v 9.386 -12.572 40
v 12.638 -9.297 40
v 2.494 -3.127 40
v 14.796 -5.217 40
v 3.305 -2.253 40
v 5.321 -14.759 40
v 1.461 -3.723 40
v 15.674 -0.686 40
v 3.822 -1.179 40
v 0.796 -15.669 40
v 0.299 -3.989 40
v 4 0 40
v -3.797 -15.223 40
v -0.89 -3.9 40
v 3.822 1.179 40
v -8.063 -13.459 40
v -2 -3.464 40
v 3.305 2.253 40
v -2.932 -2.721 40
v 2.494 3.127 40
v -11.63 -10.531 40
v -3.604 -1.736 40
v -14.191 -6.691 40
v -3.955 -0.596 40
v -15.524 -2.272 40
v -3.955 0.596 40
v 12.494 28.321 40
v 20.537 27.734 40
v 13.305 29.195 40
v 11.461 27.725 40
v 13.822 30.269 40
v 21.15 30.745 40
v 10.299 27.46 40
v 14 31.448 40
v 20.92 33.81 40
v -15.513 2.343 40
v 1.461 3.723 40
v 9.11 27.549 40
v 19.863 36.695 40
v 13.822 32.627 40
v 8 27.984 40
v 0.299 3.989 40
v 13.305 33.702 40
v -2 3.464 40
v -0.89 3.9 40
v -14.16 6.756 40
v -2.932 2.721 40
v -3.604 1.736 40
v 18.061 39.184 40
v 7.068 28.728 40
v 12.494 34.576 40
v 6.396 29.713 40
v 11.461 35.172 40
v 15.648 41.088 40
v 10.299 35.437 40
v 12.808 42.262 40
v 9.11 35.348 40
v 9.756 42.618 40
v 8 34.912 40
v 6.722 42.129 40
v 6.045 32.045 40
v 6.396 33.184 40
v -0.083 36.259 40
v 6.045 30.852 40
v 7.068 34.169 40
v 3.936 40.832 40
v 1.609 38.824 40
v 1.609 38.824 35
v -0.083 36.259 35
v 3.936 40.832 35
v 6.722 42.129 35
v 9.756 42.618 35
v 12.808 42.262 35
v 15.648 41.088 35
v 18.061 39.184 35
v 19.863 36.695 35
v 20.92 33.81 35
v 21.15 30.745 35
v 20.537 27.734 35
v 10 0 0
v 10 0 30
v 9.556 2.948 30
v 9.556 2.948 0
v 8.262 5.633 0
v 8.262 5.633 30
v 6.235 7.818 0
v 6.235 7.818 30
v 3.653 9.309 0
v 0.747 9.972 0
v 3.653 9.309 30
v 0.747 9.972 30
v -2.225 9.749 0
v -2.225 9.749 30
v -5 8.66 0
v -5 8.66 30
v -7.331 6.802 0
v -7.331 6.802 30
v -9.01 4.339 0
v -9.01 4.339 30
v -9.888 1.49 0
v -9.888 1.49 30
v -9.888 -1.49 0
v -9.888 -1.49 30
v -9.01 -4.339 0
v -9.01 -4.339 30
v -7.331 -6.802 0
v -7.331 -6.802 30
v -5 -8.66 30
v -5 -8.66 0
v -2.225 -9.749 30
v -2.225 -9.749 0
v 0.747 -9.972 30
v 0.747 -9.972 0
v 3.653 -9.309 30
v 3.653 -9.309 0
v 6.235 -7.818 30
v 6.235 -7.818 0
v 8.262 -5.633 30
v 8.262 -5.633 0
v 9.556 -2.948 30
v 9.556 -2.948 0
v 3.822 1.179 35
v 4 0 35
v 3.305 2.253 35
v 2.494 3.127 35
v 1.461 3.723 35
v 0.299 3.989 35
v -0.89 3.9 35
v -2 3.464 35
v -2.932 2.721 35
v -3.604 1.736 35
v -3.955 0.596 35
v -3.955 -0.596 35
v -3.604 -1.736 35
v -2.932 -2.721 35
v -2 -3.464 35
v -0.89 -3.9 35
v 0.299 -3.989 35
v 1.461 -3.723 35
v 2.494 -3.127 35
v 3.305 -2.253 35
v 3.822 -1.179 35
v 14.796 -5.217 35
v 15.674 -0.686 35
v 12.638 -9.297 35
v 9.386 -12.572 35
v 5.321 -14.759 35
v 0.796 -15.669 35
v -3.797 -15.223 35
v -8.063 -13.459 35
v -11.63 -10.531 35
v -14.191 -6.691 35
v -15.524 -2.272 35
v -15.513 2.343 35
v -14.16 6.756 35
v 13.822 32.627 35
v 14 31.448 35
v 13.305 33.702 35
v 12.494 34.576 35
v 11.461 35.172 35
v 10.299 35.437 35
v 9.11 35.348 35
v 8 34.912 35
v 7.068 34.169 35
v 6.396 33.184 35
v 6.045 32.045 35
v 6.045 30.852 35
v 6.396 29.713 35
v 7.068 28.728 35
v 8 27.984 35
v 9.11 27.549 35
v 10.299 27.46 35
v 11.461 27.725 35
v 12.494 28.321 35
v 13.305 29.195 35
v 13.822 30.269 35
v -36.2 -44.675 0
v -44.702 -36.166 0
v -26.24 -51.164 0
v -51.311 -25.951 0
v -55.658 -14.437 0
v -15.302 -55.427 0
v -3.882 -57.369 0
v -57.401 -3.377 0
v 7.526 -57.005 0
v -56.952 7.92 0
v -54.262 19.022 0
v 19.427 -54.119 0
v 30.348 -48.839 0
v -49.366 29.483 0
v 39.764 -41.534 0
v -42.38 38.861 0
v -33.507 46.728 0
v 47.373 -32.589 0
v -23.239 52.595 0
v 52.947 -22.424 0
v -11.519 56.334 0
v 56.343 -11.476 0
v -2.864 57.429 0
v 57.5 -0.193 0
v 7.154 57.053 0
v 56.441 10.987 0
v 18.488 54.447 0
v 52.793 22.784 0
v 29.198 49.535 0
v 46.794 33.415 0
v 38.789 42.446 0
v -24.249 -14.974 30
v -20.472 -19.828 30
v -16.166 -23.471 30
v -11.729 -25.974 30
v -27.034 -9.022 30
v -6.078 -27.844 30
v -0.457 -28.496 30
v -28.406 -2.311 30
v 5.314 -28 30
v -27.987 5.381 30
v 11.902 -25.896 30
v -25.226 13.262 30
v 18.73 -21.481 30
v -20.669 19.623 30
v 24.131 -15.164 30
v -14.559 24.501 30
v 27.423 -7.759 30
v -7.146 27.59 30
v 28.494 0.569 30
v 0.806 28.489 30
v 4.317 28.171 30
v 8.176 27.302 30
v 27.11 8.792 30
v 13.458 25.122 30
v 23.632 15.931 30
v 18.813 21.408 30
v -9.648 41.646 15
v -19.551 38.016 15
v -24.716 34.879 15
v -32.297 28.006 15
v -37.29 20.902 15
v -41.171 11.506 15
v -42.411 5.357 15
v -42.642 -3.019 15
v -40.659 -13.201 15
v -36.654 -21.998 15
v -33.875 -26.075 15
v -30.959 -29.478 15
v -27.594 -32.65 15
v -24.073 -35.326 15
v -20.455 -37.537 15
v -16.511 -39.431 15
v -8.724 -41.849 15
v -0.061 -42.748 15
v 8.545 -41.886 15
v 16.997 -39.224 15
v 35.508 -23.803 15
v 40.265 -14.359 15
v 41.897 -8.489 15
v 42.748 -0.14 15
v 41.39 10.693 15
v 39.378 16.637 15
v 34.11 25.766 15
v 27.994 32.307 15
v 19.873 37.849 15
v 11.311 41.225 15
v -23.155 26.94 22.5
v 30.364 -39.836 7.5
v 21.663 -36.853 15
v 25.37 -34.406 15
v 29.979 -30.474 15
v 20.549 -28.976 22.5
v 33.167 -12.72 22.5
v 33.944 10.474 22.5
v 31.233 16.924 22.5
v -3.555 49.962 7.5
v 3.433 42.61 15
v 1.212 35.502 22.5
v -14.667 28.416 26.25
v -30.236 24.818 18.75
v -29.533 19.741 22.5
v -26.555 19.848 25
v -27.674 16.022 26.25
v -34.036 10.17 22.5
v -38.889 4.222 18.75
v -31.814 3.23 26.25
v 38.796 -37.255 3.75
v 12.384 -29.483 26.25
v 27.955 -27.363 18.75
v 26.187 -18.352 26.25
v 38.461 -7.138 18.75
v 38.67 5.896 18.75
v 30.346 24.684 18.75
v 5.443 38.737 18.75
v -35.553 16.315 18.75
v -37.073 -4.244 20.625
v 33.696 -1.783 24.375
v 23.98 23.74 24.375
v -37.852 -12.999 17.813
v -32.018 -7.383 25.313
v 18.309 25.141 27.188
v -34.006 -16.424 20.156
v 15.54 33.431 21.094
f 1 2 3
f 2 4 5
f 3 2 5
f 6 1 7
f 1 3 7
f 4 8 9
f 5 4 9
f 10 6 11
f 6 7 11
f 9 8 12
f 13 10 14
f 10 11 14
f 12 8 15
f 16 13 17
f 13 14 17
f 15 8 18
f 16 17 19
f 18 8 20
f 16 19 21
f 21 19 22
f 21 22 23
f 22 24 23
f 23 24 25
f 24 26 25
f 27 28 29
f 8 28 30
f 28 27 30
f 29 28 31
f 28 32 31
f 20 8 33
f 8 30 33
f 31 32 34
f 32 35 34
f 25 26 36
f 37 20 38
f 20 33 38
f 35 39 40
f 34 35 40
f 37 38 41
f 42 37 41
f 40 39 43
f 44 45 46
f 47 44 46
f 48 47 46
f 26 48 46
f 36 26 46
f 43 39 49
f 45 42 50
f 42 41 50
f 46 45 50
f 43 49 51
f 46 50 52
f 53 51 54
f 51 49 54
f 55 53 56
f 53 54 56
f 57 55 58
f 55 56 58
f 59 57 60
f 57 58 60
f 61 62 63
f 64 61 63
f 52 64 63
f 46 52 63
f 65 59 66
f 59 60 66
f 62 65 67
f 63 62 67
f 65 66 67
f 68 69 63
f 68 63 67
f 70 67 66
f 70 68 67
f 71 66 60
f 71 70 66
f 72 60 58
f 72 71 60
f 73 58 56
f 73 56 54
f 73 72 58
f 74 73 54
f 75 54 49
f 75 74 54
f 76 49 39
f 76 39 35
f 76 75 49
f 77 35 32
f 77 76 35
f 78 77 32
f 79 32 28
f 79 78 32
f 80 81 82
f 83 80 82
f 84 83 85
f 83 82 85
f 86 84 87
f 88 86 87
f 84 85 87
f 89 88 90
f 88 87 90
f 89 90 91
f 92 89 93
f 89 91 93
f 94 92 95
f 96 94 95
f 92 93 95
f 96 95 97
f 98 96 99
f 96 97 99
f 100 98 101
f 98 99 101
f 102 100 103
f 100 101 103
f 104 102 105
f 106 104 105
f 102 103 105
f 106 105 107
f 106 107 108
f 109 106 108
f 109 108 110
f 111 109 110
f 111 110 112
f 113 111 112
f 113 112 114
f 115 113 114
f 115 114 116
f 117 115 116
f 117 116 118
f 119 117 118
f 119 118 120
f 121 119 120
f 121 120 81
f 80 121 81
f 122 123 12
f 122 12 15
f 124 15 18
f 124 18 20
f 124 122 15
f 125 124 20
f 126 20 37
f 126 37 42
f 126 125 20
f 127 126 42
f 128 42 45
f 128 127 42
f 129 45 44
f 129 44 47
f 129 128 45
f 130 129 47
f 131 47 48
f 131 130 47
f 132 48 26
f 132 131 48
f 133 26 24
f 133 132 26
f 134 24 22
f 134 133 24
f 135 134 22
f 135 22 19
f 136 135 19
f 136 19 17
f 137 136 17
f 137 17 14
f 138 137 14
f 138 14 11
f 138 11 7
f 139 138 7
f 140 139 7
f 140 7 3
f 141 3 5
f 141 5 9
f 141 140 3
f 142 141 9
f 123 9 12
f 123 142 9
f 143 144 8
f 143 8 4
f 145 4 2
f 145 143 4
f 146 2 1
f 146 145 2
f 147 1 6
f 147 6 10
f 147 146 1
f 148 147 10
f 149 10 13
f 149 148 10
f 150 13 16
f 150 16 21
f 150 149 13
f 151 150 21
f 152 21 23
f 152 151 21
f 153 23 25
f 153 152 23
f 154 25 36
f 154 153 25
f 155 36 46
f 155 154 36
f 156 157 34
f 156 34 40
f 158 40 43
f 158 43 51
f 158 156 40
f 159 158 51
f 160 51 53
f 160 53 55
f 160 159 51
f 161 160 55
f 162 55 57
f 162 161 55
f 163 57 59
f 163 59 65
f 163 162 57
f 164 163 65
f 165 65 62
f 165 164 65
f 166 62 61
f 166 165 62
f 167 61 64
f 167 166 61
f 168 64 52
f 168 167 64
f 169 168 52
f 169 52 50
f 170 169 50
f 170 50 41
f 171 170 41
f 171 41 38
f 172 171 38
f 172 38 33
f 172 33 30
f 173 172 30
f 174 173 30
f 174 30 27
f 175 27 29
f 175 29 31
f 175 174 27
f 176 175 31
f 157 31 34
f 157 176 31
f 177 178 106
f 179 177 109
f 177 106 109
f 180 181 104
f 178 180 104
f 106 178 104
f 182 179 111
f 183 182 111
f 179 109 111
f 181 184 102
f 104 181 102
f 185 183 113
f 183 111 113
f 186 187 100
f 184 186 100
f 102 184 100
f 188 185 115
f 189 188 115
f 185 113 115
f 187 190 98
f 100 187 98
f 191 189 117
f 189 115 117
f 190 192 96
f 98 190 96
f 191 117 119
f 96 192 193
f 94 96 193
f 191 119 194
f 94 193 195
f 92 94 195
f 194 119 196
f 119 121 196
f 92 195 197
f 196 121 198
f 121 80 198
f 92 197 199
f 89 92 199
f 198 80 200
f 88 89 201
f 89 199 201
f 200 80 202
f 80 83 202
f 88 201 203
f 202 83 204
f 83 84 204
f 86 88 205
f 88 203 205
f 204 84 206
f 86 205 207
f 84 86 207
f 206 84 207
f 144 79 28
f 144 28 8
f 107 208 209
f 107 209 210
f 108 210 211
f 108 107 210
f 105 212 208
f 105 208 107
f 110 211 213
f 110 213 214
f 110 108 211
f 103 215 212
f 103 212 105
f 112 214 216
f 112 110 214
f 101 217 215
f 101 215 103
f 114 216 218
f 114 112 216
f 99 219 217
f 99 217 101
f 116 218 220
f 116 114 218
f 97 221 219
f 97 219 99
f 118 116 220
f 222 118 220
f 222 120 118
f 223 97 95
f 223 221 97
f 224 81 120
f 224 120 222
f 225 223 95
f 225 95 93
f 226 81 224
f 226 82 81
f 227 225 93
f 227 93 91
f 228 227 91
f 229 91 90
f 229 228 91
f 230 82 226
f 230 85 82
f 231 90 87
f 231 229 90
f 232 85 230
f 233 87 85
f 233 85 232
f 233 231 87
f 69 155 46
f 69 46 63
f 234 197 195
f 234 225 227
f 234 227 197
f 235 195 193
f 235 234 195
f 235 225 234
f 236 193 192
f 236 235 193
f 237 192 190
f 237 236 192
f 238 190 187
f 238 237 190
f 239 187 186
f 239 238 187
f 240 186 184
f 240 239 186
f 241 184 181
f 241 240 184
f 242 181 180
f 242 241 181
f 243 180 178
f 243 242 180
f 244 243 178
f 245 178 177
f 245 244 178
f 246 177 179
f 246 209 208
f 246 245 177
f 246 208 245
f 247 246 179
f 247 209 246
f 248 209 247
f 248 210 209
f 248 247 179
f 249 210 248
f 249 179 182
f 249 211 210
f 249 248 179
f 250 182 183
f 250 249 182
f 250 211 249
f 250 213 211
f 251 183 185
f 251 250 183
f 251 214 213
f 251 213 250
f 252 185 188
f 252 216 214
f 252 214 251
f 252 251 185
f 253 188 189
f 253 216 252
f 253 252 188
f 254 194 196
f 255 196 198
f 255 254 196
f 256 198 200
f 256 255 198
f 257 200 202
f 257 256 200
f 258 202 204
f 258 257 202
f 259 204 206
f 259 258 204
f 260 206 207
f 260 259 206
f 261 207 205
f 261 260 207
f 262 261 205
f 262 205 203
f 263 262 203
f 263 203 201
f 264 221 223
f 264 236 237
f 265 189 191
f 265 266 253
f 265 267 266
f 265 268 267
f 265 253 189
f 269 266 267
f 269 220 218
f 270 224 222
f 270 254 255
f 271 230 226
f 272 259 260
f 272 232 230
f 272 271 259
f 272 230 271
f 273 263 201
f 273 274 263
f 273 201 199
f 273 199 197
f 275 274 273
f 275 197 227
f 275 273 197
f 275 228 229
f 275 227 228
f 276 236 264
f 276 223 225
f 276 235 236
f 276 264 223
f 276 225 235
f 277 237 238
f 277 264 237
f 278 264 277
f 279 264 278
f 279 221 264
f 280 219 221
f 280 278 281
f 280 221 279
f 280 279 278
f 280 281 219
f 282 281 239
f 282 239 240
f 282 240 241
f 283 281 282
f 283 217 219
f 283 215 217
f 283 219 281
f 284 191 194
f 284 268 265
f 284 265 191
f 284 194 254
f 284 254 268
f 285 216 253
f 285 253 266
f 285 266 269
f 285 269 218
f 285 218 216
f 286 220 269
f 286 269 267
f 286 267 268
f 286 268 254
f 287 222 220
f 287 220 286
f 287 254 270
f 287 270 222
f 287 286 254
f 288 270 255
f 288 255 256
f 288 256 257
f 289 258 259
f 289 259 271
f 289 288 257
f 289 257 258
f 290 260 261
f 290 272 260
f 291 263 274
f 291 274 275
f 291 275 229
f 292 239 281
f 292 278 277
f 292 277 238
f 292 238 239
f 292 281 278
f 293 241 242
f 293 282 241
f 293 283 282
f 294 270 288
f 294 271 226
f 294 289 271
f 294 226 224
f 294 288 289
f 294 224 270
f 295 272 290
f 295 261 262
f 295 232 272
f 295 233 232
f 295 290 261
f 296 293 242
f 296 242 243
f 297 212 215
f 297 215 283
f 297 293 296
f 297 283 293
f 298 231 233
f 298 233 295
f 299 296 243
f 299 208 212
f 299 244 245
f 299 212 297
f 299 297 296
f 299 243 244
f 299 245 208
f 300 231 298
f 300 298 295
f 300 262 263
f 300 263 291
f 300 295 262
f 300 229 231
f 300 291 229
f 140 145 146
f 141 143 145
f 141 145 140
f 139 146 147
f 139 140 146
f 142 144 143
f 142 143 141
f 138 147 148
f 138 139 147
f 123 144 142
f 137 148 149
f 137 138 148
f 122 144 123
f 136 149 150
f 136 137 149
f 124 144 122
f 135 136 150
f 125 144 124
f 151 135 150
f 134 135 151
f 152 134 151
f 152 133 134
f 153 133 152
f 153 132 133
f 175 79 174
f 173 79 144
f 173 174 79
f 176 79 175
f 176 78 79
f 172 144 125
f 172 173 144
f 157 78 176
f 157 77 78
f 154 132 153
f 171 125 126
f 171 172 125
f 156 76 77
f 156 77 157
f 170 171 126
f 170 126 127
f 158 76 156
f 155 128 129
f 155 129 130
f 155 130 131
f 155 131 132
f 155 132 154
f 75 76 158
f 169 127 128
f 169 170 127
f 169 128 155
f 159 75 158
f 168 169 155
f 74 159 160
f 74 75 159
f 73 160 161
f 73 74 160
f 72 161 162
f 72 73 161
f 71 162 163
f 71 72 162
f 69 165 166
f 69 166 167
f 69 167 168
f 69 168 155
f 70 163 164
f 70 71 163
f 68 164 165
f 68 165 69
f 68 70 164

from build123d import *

# Parameters (mm, degrees)
SKETCH3_R           = 10
CUT_EXTRUDE1_DEPTH  = 87.674679284
SKETCH5_R           = 4
BOSS_EXTRUDE1_DEPTH = 5


with BuildPart() as part:
    # Loft1: read off the stored shape, not the designer's step
    # Loft1: loft between two sections, ruled curve by curve
    loft1_from = [
        Edge.make_bspline([(-11.518722123, 56.334439206, 0), (-124.187600535, 33.29699496, 0), (-101.150156289, -79.371883452, 0), (11.518722123, -56.334439206, 0), (124.187600535, -33.29699496, 0), (101.150156289, 79.371883452, 0), (-11.518722123, 56.334439206, 0)], [0, 0, 0, 0, 0.5, 0.5, 0.5, 1, 1, 1, 1], 3, [1, 0.333333333, 0.333333333, 1, 0.333333333, 0.333333333, 1]),
    ]
    loft1_to = [
        Edge.make_bspline([(0.805711153, 28.488608768, 30), (-56.171506383, 30.100031074, 30), (-57.782928689, -26.877186462, 30), (-0.805711153, -28.488608768, 30), (56.171506383, -30.100031074, 30), (57.782928689, 26.877186462, 30), (0.805711153, 28.488608768, 30)], [0, 0, 0, 0, 0.5, 0.5, 0.5, 1, 1, 1, 1], 3, [1, 0.333333333, 0.333333333, 1, 0.333333333, 0.333333333, 1]),
    ]
    loft1 = Solid(Shell([*[Face.make_surface_from_curves(loft1_from[k], loft1_to[k]) for k in range(1)], Face(Wire(loft1_from)), Face(Wire(loft1_to))]))
    add(loft1)

    # Sketch3 → Cut-Extrude1 (cut, through all)
    with BuildSketch(Plane.XY.offset(30)):
        Circle(SKETCH3_R)
    extrude(amount=-CUT_EXTRUDE1_DEPTH, mode=Mode.SUBTRACT)


with BuildPart() as body_2:
    # Sketch5 → Boss-Extrude1 (new body)
    with BuildSketch(Plane.XY.offset(35)):
        with BuildLine():
            Line((20.53658968, 27.734193457), (15.674084092, -0.686210928))
            ThreePointArc((15.674084092, -0.686210928), (-3.79737719, -15.222605691), (-14.159917768, 6.756073293))
            Line((-14.159917768, 6.756073293), (-0.083141296, 36.25930522))
            ThreePointArc((-0.083141296, 36.25930522), (14.268581322, 41.772809638), (20.53658968, 27.734193457))
        make_face()
        with Locations((10, 31.448370387)):
            Circle(SKETCH5_R, mode=Mode.SUBTRACT)
        Circle(SKETCH5_R, mode=Mode.SUBTRACT)
    extrude(amount=BOSS_EXTRUDE1_DEPTH)


solid = Compound([part.part, body_2.part])
